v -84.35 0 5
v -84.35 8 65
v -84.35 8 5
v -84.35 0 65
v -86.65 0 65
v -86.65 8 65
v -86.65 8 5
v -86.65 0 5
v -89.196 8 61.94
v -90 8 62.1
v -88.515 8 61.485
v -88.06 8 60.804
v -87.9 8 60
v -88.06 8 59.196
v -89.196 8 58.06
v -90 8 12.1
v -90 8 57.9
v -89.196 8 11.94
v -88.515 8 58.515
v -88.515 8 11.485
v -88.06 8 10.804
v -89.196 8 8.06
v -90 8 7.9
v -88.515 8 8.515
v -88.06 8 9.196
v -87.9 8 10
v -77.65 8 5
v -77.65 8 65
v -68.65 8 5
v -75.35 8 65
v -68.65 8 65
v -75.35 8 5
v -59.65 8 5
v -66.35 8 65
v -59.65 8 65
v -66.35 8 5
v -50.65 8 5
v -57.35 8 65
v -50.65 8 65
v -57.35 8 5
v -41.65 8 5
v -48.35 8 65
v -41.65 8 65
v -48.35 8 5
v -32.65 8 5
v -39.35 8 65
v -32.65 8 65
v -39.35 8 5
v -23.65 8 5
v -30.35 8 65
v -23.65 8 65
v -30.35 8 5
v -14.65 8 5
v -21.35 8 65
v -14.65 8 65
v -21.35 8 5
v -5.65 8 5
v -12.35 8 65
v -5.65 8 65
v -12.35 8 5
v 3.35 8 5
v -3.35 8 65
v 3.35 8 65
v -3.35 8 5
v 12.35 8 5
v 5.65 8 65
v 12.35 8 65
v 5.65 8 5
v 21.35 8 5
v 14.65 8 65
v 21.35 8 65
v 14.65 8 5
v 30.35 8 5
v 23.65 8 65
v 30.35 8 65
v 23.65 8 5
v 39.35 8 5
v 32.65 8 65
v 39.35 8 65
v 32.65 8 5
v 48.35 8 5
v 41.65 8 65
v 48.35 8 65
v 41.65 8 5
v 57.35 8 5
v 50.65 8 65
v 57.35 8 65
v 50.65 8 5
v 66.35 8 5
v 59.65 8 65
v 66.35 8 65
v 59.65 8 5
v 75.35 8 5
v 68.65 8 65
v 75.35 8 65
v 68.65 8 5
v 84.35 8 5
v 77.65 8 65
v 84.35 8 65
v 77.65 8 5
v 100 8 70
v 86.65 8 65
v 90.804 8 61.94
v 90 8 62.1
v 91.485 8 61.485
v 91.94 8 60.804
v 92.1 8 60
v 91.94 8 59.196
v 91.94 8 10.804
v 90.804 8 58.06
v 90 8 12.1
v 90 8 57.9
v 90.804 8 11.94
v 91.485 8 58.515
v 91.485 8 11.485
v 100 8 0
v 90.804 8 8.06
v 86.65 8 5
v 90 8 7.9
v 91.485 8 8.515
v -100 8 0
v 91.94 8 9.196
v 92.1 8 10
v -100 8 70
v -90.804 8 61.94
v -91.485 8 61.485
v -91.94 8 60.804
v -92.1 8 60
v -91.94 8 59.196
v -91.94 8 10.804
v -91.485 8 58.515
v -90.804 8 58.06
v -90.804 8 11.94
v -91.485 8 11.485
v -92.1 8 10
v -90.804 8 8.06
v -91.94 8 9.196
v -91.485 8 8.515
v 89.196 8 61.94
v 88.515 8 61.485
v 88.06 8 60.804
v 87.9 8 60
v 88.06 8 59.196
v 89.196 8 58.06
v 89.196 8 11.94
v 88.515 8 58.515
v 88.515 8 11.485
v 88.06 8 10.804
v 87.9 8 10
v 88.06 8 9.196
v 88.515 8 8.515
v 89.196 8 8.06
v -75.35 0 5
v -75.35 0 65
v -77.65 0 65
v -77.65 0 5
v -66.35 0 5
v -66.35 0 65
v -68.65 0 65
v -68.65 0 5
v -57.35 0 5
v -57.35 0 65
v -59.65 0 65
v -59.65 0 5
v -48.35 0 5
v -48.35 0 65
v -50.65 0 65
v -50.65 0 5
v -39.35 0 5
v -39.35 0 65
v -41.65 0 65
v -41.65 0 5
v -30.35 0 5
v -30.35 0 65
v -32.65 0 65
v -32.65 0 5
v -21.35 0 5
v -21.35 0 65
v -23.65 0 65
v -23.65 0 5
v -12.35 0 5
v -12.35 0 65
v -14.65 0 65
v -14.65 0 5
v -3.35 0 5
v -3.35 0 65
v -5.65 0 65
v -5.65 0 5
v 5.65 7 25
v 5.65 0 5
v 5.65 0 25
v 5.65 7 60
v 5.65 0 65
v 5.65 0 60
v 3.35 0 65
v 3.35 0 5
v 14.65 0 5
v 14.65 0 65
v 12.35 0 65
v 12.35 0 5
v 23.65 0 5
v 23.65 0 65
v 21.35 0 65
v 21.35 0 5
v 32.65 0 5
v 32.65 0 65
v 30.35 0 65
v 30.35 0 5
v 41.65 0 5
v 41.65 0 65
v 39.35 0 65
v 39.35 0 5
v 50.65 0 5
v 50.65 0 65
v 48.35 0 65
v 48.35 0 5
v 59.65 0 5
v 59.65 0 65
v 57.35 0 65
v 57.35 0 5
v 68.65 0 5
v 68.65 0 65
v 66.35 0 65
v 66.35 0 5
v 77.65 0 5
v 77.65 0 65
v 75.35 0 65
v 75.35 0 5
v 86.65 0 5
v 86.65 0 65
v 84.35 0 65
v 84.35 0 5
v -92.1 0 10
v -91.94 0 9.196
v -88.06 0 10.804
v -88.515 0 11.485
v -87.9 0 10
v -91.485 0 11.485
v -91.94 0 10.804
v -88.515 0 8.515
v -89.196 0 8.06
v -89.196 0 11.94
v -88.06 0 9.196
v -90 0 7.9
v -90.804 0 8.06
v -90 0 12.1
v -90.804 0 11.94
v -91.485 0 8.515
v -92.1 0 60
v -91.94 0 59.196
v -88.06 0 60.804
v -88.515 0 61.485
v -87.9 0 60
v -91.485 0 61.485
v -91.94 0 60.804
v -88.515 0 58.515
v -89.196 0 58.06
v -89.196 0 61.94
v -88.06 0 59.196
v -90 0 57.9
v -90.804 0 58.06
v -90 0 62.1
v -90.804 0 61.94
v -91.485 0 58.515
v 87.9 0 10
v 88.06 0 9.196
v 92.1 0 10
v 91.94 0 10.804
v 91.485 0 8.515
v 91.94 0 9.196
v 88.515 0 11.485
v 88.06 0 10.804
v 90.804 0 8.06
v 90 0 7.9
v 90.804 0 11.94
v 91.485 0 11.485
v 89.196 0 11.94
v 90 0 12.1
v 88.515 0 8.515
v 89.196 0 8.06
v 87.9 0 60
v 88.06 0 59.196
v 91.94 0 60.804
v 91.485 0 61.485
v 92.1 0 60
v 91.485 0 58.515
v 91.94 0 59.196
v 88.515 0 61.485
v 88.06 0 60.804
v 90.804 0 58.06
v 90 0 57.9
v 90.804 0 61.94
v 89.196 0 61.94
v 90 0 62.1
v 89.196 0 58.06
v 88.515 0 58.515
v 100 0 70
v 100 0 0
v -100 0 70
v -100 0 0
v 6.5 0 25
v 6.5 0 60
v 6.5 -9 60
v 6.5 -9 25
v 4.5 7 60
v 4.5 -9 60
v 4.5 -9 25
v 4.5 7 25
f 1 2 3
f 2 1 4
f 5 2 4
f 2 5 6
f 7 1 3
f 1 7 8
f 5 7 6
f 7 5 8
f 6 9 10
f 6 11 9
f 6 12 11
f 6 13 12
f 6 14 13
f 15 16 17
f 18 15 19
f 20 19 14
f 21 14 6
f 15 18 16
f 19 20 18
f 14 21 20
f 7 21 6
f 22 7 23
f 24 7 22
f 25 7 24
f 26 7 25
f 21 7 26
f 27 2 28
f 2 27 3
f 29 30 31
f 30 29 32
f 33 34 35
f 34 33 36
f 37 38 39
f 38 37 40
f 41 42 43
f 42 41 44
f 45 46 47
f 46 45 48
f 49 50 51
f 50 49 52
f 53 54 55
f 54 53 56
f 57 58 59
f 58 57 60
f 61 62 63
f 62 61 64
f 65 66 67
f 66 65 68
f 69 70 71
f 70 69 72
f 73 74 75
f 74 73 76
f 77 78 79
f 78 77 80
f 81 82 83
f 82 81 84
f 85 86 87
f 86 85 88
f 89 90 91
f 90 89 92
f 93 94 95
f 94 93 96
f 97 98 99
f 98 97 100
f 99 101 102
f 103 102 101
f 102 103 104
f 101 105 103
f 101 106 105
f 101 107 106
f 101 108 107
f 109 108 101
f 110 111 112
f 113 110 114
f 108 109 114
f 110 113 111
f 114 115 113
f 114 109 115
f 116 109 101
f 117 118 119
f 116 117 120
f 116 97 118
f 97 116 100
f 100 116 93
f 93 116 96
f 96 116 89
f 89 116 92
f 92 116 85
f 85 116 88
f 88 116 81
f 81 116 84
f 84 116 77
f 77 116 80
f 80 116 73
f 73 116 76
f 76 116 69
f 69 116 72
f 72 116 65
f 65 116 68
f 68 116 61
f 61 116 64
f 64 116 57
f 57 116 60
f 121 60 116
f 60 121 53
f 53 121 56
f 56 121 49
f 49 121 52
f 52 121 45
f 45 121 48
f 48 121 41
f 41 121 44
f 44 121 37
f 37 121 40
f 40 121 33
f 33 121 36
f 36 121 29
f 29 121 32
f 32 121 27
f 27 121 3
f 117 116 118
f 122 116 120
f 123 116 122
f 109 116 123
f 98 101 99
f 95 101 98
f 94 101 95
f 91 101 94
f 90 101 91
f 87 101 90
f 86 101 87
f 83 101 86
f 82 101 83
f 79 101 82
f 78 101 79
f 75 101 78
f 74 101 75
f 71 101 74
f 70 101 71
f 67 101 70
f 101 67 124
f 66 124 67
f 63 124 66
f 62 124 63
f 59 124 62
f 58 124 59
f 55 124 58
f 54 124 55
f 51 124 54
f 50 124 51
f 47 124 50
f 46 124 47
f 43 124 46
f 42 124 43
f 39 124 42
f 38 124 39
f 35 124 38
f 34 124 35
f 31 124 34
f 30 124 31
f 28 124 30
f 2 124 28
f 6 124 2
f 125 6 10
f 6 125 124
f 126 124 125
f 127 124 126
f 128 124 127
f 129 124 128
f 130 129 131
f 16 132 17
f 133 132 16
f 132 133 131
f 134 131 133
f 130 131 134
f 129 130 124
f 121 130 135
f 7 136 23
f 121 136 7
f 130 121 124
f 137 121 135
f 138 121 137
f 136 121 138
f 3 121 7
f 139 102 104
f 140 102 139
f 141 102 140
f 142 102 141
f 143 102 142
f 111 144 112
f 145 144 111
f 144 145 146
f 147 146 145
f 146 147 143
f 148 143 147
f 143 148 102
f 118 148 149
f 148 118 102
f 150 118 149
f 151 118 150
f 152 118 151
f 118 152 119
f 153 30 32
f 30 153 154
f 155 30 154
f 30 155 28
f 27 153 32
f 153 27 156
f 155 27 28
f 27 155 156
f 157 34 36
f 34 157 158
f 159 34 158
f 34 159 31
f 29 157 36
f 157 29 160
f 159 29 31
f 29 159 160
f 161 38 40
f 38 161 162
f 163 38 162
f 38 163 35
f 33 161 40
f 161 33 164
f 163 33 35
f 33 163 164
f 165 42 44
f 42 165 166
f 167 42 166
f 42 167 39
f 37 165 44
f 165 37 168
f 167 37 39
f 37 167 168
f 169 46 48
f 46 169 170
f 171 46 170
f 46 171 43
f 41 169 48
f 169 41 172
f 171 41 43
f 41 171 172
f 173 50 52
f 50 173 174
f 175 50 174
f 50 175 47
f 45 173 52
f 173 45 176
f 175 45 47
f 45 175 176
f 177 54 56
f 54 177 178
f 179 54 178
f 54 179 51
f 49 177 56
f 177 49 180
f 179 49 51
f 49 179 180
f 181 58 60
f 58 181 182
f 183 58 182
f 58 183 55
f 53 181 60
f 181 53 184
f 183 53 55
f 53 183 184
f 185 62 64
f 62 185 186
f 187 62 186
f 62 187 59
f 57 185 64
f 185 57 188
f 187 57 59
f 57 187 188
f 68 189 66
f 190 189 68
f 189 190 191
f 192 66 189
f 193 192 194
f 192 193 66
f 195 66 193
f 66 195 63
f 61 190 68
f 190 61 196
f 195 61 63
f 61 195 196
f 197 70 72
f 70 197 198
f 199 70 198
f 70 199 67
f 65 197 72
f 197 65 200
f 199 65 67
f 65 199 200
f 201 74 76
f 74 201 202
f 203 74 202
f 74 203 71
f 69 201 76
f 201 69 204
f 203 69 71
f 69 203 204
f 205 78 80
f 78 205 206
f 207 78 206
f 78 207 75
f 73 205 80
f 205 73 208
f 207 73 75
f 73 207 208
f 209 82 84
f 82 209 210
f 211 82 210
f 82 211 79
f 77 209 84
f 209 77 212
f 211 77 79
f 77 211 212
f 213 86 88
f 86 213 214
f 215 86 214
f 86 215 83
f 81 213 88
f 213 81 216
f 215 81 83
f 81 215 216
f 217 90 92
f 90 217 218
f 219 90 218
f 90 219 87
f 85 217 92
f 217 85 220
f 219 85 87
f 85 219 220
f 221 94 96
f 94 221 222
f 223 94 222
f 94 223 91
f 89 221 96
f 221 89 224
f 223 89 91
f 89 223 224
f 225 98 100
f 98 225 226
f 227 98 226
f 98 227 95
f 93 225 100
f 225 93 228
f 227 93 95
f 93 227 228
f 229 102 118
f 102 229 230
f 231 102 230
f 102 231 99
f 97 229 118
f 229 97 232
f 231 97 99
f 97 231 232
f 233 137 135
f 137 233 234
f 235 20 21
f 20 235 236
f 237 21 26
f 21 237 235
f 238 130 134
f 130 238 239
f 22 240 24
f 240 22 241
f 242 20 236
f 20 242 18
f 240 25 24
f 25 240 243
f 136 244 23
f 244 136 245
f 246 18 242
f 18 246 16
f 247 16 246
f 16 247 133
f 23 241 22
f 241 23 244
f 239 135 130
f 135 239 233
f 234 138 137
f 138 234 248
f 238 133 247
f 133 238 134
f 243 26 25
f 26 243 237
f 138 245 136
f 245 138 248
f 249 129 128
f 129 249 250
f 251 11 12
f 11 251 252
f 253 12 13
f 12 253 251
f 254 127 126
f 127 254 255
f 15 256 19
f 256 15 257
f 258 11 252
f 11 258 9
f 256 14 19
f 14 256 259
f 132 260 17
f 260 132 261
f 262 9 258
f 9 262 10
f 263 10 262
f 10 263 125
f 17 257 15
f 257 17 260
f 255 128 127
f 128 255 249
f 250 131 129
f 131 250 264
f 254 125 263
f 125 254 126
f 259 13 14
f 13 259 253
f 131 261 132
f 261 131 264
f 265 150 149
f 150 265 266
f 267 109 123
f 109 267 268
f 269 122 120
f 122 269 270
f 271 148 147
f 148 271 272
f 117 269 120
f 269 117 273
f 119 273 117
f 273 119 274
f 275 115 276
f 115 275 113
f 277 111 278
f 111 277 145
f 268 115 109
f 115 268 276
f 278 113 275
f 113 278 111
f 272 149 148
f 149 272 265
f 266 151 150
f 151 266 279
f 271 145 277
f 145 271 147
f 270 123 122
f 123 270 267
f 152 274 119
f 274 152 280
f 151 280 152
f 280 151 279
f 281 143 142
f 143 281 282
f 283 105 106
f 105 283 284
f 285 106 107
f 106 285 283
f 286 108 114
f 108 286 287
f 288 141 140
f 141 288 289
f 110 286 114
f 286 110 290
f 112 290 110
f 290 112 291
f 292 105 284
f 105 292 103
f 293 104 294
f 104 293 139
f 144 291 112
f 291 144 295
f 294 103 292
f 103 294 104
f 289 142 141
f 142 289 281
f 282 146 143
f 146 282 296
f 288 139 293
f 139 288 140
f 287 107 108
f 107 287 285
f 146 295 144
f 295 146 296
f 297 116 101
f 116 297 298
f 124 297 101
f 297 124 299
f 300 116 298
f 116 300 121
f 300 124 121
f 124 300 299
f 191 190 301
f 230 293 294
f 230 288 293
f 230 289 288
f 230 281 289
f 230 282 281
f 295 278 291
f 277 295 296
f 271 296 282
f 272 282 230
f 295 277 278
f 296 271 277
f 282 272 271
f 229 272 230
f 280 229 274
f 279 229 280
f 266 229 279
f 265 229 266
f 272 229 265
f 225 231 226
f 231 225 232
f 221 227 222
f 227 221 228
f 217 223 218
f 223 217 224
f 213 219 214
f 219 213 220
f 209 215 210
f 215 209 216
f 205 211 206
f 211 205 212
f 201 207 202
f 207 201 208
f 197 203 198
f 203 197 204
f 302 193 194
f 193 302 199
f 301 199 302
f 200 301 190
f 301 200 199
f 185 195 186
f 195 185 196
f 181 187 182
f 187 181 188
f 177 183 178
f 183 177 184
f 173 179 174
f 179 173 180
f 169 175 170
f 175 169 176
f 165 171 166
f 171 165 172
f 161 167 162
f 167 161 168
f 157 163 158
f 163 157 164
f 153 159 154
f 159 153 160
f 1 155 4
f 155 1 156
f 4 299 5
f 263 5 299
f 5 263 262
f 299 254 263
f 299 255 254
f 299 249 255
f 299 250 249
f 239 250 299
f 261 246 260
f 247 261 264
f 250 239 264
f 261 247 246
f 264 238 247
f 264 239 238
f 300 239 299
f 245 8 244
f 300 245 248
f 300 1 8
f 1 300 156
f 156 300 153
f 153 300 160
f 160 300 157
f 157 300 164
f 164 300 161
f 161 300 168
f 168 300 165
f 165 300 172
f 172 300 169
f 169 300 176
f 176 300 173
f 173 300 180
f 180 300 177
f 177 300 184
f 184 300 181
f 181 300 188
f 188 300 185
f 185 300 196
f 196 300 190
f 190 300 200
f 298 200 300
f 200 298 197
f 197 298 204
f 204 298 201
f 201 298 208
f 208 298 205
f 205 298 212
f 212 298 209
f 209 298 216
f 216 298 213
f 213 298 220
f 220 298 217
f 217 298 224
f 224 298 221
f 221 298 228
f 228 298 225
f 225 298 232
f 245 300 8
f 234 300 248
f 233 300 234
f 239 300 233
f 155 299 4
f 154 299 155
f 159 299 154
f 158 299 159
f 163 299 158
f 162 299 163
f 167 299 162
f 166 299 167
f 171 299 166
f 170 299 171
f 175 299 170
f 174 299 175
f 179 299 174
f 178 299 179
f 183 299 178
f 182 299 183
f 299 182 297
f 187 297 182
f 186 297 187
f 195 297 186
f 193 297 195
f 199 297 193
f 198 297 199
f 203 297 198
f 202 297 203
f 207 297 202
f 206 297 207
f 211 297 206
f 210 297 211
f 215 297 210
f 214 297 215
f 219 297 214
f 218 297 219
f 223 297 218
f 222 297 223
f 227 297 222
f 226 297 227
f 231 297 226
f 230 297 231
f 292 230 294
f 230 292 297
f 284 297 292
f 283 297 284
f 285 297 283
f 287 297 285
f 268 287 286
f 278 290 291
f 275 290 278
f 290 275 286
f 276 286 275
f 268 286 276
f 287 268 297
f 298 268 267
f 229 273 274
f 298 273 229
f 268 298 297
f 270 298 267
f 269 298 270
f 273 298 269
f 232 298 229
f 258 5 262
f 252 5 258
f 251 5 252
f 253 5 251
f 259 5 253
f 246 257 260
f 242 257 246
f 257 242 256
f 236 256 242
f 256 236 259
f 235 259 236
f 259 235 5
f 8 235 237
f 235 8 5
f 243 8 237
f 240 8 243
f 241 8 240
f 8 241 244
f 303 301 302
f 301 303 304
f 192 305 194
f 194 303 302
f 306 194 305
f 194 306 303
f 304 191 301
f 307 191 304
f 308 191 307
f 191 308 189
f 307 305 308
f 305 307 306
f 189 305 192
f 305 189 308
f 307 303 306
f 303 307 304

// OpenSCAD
// file: ../common.scad
/*
 * WAVE OCEAN V10 - 3-LAYER TRUE INTERLOCKING DESIGN
 *
 * CRITICAL FIX: Slats now have X-OFFSET per layer
 * Like interlocked fingers - each layer's slats fit IN THE GAPS
 *
 * LAYER ORDER (reversed):
 * - Layer 0 = BACK (Y=20, dark blue, has back tabs)
 * - Layer 1 = MID (Y=10, medium blue)
 * - Layer 2 = FRONT (Y=0, light blue, closest to viewer)
 *
 * All dimensions in mm
 */

// ============================================
// PRINT TOLERANCES
// ============================================

TOL_CLEARANCE = 0.2;
TOL_SLIDING = 0.3;
TOL_PRESS_FIT = -0.1;

// ============================================
// HARDWARE
// ============================================

BEARING_608_ID = 8;
BEARING_608_OD = 22;
BEARING_608_H = 7;

SHAFT_DIA = 8;
SHAFT_HOLE = SHAFT_DIA + TOL_CLEARANCE;

M3_HOLE = 3.2;
M3_HEAD_DIA = 5.5;
M4_HOLE = 4.2;

// ============================================
// SLAT DIMENSIONS - CORRECTED FOR INTERLOCKING
// ============================================

SLAT_THICKNESS = 2;          // X dimension - REDUCED for gaps
SLAT_DEPTH = 10;             // Y dimension
SLAT_BASE_HEIGHT = 35;
SLAT_HEIGHT_VAR = 12;

// SPACING - Must be 3x thickness for 3-layer interlocking
SLAT_SPACING = 9;            // INCREASED from 5mm
CAM_LENGTH = 180;
NUM_SLATS = floor(CAM_LENGTH / SLAT_SPACING);  // 20 slats per layer

// Height variation
function slat_height(i) =
    SLAT_BASE_HEIGHT + SLAT_HEIGHT_VAR *
    (0.5 + 0.3 * sin(i * 45) + 0.2 * sin(i * 90));

// ============================================
// X-OFFSET - THE KEY TO TRUE INTERLOCKING
// ============================================

// Each layer offset by spacing/3 = 3mm
LAYER_X_OFFSET = [0, 3, 6];

// Slat X position - NOW INCLUDES LAYER OFFSET
function slat_x(i, layer) =
    (i - (NUM_SLATS - 1) / 2) * SLAT_SPACING + LAYER_X_OFFSET[layer];

/*
 * INTERLOCKING GEOMETRY:
 *
 * With SLAT_THICKNESS=2mm and SLAT_SPACING=9mm:
 *
 * Layer 0: X = 0, 9, 18...  (slats occupy X-1 to X+1)
 * Layer 1: X = 3, 12, 21... (slats occupy X+2 to X+4)
 * Layer 2: X = 6, 15, 24... (slats occupy X+5 to X+7)
 *
 * Gap between adjacent slats = 1mm (safe!)
 */

// ============================================
// LAYER CONFIGURATION - REVERSED ORDER
// ============================================

NUM_LAYERS = 3;

// Layer Y positions (REVERSED: 0=back, 2=front)
LAYER_Y_CENTER = [20, 10, 0];  // Back to front

// Colors (back=dark, front=light)
LAYER_COLORS = [
    [0.08, 0.25, 0.50],      // Layer 0 (back) - dark blue
    [0.15, 0.40, 0.65],      // Layer 1 (mid) - medium blue
    [0.25, 0.55, 0.80]       // Layer 2 (front) - light blue
];

// ============================================
// CAM CONFIGURATION
// ============================================

CAM_WIDTH = 8;               // Y dimension - thin
CAM_CORE_RADIUS = 6;
CAM_RIDGE_HEIGHT = 8;
CAM_MAX_RADIUS = CAM_CORE_RADIUS + CAM_RIDGE_HEIGHT;  // 14mm

// Cam Y positions (match layer Y positions)
CAM_Y = [20, 10, 0];         // Same as LAYER_Y_CENTER

NUM_RIDGES = 2;
HELIX_TURNS = NUM_RIDGES;

// ============================================
// PHASE OFFSETS - CASCADING WAVE
// ============================================

// Layer 0 (back) leads, Layer 2 (front) follows
LAYER_PHASE_OFFSET = [0, 40, 80];

// ============================================
// PHASE CALCULATION
// ============================================

function slat_phase(i, layer, theta) =
    let(x = slat_x(i, layer))
    let(helix_angle = ((x + CAM_LENGTH/2) / CAM_LENGTH) * 360 * HELIX_TURNS)
    helix_angle + theta + LAYER_PHASE_OFFSET[layer];

function cam_surface_at_slat(i, layer, theta) =
    let(phase = slat_phase(i, layer, theta))
    CAM_CORE_RADIUS + CAM_RIDGE_HEIGHT * (0.5 + 0.5 * cos(phase));

function slat_z(i, layer, theta) =
    CAM_CENTER_Z + cam_surface_at_slat(i, layer, theta);

// ============================================
// HINGE CONFIGURATION
// ============================================

HINGE_HEIGHT_FROM_BOTTOM = 20;
HINGE_ROD_DIA = 1.6;             // Reduced from 2mm for less binding risk
HINGE_SLOT_LENGTH = 15;
HINGE_SLOT_WIDTH = HINGE_ROD_DIA + TOL_SLIDING;

// ============================================
// BACKPLATE CONFIGURATION (for Layer 0 = BACK)
// ============================================

BACKPLATE_Y = LAYER_Y_CENTER[0] + SLAT_DEPTH/2 + 5;  // Behind Layer 0 (Y > 25)
BACKPLATE_WIDTH = CAM_LENGTH + 20;
BACKPLATE_HEIGHT = 70;
BACKPLATE_THICKNESS = 8;

// Back tab (on Layer 0 slats)
TAB_THICKNESS = SLAT_THICKNESS;
TAB_DEPTH = 6;
TAB_HEIGHT = 25;

GROOVE_WIDTH = TAB_THICKNESS + TOL_SLIDING;
GROOVE_DEPTH = TAB_DEPTH + 2;

// ============================================
// FOLLOWER
// ============================================

FOLLOWER_HEIGHT = 4;
FOLLOWER_CURVE_RADIUS = CAM_CORE_RADIUS + 1;

// ============================================
// ASSEMBLY POSITIONS
// ============================================

BB_WIDTH = 24;
BB_DEPTH = 30;  // Wider to span all 3 cam Y positions
BB_HEIGHT = CAM_MAX_RADIUS + 6;

BEARING_POCKET_DIA = BEARING_608_OD - TOL_PRESS_FIT;
BEARING_POCKET_DEPTH = BEARING_608_H + 0.5;

CAM_CENTER_Z = BB_HEIGHT;

BB_LEFT_X = -CAM_LENGTH / 2 - BB_WIDTH / 2 - 5;
BB_RIGHT_X = CAM_LENGTH / 2 + BB_WIDTH / 2 + 5;

SHAFT_LENGTH = CAM_LENGTH + BB_WIDTH * 2 + 40;

// ============================================
// COLORS
// ============================================

C_CAM = [0.65, 0.5, 0.3];
C_BACKPLATE = [0.2, 0.18, 0.15];
C_BB = [0.35, 0.35, 0.4];
C_SHAFT = [0.6, 0.6, 0.65];
C_FRAME = [0.25, 0.22, 0.20];
C_HINGE = [0.5, 0.5, 0.55];

function slat_color(layer) = LAYER_COLORS[layer];

// ============================================
// QUALITY
// ============================================

$fn = 48;

// ============================================
// VERIFICATION
// ============================================

echo("============================================");
echo("  TRUE INTERLOCKING WAVE DESIGN");
echo("============================================");
echo("");
echo("INTERLOCKING (X-OFFSET per layer):");
echo(str("  LAYER_X_OFFSET: ", LAYER_X_OFFSET, "mm"));
echo(str("  Slat thickness: ", SLAT_THICKNESS, "mm"));
echo(str("  Slat spacing: ", SLAT_SPACING, "mm"));
echo(str("  Gap between slats: ", SLAT_SPACING/3 - SLAT_THICKNESS, "mm"));
echo("");
echo("LAYER ORDER (reversed):");
echo(str("  Layer 0 (BACK): Y=", LAYER_Y_CENTER[0], "mm, has back tabs"));
echo(str("  Layer 1 (MID):  Y=", LAYER_Y_CENTER[1], "mm"));
echo(str("  Layer 2 (FRONT): Y=", LAYER_Y_CENTER[2], "mm"));
echo("");
echo(str("Slats per layer: ", NUM_SLATS));
echo(str("Total slats: ", NUM_SLATS * NUM_LAYERS));
// main file
/*
 * BACKPLATE - Guide Grooves for Layer 0 (BACK) Slats
 *
 * CORRECTED: Now positioned behind Layer 0 (Y > 25)
 * Layer 0 is the BACK layer at Y=20
 *
 * Contains 20 vertical grooves for Layer 0 slat tabs.
 */

include <../common.scad>

$fn = 32;

// ============================================
// BACKPLATE MODULE
// ============================================

module backplate() {
    difference() {
        plate_body();
        slat_grooves();
        mounting_holes();
    }
}

// ============================================
// PLATE BODY
// ============================================

module plate_body() {
    translate([-BACKPLATE_WIDTH/2, 0, 0])
        cube([BACKPLATE_WIDTH, BACKPLATE_THICKNESS, BACKPLATE_HEIGHT]);
}

// ============================================
// SLAT GROOVES (for Layer 0 tabs - using LAYER_X_OFFSET)
// ============================================

module slat_grooves() {
    // 20 vertical grooves for Layer 0 slat tabs
    // Layer 0 has X offset = 0

    for (i = [0 : NUM_SLATS - 1]) {
        // Use slat_x with layer=0 to get correct X positions
        x = slat_x(i, 0);

        groove_width = GROOVE_WIDTH;
        groove_height = BACKPLATE_HEIGHT - 10;

        translate([x - groove_width/2, -1, 5])
            cube([groove_width, GROOVE_DEPTH + 1, groove_height]);
    }
}

// ============================================
// MOUNTING HOLES
// ============================================

module mounting_holes() {
    hole_inset = 10;

    for (x = [-BACKPLATE_WIDTH/2 + hole_inset, BACKPLATE_WIDTH/2 - hole_inset]) {
        for (z = [hole_inset, BACKPLATE_HEIGHT - hole_inset]) {
            translate([x, BACKPLATE_THICKNESS/2, z])
            rotate([90, 0, 0])
                cylinder(d = M4_HOLE, h = BACKPLATE_THICKNESS + 2, center = true, $fn = 16);
        }
    }
}

// ============================================
// RENDER
// ============================================

color(C_BACKPLATE)
    backplate();

// Show sample Layer 0 slat position
translate([slat_x(10, 0), -SLAT_DEPTH/2 - TAB_DEPTH + 2, 25])
color(LAYER_COLORS[0], 0.5)
    cube([SLAT_THICKNESS, SLAT_DEPTH + TAB_DEPTH, 35]);

// ============================================
// INFO
// ============================================

echo("=== BACKPLATE (CORRECTED) ===");
echo(str("Position: Y=", BACKPLATE_Y, "mm (behind Layer 0)"));
echo(str("Width: ", BACKPLATE_WIDTH, "mm"));
echo(str("Height: ", BACKPLATE_HEIGHT, "mm"));
echo("");
echo(str("Grooves: ", NUM_SLATS, " (for Layer 0 slats)"));
echo("Layer 0 is BACK layer, has back tabs");
